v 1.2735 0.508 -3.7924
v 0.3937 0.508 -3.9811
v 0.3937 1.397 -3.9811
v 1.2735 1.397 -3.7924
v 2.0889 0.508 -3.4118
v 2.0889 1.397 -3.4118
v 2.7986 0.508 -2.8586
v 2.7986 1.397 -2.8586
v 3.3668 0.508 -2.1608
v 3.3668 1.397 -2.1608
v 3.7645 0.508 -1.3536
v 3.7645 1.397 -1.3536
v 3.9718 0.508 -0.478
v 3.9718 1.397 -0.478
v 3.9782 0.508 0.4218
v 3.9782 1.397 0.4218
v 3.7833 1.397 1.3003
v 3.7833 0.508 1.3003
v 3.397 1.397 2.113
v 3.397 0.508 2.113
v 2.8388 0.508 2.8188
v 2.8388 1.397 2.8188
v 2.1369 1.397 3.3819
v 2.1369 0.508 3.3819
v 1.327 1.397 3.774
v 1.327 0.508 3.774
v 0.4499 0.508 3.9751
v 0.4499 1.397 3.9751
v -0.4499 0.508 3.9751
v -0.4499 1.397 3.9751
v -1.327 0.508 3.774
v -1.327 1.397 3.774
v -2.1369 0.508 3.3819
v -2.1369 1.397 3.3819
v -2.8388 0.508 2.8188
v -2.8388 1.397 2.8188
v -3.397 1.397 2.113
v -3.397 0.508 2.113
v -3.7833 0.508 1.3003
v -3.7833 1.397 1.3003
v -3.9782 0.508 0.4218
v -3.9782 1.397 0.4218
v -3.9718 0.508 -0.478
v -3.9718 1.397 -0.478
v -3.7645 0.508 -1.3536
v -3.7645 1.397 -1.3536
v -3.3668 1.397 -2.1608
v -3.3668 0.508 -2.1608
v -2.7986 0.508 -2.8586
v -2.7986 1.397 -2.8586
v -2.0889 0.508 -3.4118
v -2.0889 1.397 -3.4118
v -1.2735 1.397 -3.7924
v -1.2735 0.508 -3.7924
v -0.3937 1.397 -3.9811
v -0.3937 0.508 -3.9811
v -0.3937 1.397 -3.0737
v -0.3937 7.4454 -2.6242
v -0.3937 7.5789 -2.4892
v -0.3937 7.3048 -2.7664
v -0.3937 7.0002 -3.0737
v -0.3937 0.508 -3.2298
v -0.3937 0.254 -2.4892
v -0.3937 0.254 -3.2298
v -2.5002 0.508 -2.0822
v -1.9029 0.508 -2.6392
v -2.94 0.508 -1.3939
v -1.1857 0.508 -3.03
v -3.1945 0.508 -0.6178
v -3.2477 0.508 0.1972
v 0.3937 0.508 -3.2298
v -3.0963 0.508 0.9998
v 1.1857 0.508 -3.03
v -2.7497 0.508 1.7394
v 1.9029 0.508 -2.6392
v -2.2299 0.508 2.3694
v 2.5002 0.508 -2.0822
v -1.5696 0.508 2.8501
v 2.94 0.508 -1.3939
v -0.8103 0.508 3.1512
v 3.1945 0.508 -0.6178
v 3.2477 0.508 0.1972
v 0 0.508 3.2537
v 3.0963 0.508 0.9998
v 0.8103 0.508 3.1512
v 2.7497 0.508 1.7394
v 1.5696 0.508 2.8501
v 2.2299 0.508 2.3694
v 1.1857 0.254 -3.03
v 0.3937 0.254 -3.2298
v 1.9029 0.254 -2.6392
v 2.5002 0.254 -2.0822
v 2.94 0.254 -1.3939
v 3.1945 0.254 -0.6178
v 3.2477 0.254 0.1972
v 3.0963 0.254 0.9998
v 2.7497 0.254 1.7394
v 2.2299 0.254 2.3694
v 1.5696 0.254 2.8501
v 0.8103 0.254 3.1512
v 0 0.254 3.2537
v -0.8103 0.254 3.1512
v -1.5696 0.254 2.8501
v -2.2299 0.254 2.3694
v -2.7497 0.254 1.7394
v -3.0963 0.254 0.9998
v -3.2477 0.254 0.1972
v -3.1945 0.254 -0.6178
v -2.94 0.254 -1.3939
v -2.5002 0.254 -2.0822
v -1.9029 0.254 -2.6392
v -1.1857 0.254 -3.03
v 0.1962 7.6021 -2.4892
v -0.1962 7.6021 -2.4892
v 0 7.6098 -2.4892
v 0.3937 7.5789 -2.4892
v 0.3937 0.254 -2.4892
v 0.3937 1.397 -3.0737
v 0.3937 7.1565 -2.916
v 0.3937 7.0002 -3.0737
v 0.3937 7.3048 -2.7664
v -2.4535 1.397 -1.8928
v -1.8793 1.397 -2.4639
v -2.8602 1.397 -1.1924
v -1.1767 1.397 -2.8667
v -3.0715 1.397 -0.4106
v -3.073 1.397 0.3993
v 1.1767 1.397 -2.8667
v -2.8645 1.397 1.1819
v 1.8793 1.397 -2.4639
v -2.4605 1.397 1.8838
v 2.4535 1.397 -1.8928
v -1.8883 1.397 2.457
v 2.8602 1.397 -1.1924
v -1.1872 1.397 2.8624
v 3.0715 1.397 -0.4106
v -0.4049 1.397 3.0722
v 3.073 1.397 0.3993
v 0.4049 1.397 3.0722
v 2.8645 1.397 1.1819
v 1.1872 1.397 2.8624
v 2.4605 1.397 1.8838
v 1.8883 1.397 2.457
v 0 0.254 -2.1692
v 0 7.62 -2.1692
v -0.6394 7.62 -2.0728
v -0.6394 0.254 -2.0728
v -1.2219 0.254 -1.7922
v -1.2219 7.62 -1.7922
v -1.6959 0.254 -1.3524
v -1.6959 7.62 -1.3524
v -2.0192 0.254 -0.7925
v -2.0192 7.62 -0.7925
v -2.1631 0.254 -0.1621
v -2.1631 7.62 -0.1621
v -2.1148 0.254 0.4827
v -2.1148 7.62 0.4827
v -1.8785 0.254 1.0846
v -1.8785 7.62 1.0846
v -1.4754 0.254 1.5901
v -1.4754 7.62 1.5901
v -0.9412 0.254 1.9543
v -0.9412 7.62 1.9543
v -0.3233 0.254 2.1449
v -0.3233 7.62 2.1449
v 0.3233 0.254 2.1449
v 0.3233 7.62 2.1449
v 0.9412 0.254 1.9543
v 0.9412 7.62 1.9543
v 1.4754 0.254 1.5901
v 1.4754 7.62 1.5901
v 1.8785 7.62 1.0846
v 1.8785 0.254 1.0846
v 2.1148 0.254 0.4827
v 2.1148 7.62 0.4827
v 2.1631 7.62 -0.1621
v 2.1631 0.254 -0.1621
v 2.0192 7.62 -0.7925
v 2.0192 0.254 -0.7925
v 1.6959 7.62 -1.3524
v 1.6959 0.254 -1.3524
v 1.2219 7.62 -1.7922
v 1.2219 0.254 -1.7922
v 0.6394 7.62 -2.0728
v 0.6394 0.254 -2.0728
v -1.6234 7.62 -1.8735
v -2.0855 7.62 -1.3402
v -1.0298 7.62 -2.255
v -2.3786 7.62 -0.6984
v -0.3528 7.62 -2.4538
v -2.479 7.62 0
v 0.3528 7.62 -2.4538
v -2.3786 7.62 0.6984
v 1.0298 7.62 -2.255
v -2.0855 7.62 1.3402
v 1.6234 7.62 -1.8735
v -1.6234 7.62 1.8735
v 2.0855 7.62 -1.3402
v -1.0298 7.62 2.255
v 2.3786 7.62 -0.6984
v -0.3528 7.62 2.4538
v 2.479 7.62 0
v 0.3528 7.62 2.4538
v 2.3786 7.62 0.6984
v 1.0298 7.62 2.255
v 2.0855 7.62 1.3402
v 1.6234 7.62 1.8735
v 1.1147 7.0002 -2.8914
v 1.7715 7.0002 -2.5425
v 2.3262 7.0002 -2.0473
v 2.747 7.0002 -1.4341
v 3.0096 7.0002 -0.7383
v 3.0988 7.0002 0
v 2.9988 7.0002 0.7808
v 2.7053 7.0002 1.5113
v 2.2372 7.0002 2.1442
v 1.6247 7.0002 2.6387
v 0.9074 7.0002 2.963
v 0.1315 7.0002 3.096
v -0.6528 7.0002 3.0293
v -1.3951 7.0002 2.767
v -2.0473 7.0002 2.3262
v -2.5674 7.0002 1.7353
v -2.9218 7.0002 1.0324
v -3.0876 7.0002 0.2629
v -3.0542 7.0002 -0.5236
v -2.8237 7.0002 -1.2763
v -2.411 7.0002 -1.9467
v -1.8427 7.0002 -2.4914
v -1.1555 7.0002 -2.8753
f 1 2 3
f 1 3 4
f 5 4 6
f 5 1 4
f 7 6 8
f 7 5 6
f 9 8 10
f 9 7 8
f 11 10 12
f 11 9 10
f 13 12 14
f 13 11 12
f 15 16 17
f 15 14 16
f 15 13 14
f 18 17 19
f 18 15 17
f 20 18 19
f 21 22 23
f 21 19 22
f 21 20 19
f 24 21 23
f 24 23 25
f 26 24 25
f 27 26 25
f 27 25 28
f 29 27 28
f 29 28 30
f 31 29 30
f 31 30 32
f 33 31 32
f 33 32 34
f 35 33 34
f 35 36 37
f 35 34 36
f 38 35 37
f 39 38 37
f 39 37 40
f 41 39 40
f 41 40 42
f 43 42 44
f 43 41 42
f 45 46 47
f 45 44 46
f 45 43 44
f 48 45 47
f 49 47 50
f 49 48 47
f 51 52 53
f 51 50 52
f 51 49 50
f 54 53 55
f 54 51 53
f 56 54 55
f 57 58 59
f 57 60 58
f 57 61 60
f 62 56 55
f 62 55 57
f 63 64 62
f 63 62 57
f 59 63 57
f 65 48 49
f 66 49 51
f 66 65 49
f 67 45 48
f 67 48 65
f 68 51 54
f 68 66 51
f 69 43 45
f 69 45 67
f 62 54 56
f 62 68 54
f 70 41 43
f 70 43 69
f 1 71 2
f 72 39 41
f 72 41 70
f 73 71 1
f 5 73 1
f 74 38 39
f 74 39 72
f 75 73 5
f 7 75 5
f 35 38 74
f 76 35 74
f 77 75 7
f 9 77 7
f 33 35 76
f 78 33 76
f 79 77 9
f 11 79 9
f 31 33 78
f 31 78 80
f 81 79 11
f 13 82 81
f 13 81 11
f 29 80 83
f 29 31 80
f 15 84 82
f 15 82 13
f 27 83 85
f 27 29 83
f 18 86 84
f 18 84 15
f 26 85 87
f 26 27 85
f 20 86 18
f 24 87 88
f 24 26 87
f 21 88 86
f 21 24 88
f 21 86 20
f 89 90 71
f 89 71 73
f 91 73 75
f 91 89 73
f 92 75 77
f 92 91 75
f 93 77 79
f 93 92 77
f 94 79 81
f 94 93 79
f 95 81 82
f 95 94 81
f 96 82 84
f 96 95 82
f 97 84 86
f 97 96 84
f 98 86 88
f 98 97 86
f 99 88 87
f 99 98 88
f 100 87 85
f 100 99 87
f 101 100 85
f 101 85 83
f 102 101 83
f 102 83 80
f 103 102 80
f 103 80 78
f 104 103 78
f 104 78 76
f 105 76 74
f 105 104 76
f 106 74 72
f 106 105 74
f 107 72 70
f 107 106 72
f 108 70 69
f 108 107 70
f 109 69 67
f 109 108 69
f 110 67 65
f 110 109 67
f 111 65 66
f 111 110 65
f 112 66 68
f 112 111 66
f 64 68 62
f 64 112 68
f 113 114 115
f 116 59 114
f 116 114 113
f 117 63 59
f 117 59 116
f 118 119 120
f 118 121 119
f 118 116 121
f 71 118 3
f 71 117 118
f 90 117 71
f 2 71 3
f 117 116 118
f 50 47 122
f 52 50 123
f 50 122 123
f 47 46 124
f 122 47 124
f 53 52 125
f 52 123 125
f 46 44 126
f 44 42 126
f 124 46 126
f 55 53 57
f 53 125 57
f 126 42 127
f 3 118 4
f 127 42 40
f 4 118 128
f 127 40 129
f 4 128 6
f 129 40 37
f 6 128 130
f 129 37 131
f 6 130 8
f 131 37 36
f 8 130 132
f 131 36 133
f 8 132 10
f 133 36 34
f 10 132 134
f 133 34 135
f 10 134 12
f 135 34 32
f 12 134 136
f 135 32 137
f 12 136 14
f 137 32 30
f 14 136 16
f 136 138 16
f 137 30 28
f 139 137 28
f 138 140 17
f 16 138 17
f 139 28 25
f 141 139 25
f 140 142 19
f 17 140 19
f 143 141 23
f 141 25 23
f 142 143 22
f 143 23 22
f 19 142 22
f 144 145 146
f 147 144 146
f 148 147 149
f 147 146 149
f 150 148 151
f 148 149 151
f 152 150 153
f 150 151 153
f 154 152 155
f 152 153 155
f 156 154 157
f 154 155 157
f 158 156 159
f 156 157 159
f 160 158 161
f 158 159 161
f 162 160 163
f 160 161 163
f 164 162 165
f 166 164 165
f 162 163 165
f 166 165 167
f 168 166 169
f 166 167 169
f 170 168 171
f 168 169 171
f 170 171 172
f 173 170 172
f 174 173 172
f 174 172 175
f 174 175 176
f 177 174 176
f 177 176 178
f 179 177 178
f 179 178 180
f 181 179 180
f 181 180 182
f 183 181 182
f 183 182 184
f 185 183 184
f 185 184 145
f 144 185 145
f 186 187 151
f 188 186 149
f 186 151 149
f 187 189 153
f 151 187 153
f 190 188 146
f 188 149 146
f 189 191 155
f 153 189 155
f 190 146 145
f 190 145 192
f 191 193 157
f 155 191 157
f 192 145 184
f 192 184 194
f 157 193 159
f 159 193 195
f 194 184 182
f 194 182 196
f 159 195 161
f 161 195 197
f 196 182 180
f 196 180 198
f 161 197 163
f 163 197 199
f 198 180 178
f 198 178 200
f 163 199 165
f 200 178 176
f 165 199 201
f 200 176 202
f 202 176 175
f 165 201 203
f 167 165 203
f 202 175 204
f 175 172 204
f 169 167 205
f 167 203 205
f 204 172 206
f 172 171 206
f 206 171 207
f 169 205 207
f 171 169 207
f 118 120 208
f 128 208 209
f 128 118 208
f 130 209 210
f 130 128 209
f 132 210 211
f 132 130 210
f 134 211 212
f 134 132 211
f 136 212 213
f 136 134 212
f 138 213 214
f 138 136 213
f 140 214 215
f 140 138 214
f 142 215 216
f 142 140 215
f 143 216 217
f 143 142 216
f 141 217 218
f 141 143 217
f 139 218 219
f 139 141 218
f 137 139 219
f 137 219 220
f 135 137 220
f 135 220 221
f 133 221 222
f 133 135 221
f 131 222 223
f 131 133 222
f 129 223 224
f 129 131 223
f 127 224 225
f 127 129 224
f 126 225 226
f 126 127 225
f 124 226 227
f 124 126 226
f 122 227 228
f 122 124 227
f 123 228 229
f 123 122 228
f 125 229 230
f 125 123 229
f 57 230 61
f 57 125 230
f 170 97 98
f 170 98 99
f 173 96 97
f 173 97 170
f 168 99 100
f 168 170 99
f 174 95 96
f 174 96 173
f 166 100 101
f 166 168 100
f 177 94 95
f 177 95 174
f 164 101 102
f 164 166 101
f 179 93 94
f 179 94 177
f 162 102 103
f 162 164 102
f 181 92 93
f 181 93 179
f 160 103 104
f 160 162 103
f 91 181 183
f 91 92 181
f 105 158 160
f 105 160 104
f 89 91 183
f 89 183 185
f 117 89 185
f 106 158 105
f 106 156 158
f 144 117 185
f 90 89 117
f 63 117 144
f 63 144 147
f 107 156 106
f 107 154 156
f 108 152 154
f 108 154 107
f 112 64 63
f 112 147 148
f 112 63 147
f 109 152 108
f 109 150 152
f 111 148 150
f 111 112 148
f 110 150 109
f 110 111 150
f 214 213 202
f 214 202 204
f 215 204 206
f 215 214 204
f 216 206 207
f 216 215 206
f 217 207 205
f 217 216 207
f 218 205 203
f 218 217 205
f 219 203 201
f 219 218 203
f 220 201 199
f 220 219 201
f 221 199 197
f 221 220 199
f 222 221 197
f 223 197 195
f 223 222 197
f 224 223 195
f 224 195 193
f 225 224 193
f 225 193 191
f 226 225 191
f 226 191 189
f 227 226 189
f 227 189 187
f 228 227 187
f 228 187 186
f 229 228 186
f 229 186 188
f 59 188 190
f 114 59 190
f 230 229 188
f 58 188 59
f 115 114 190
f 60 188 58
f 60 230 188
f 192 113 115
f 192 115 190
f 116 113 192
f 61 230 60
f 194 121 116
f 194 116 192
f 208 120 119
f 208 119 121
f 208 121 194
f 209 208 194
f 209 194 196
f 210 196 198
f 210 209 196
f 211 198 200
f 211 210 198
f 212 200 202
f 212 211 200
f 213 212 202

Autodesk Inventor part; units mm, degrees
sketch "Sketch_1" plane through (0, 0, 0) normal (0, 0, 1) x (1, 0, 0)
  line L0 (-3.9497, 0) -> (3.9497, 0)
  arc A0 (3.9497, 0) -> (3.6957, 0.254) centre (3.6957, 0) ccw
  line L1 (3.6957, 0.254) -> (-3.6957, 0.254)
  arc A1 (-3.6957, 0.254) -> (-3.9497, 0) centre (-3.6957, 0) ccw
extrude "Extrusion1" add sketch "Sketch_1" along normal mid plane 13.0048
sketch "Sketch_7" plane through (0, 0, 0) normal (0, 0, 1) x (1, 0, 0)
  line L0 (0, 0.127) -> (0, 7.62)
  line L1 (0, 7.62) -> (2.479, 7.62)
  line L2 (2.479, 7.62) -> (3.0988, 7.0002)
  line L3 (3.0988, 7.0002) -> (3.0988, 1.397)
  line L4 (3.0988, 1.397) -> (4.0005, 1.397)
  line L5 (4.0005, 1.397) -> (4.0005, 0.508)
  line L6 (4.0005, 0.508) -> (3.2537, 0.508)
  line L7 (3.2537, 0.508) -> (3.2537, 0.127)
  line L8 (3.2537, 0.127) -> (0, 0.127)
  line L9 (0, 0.127) -> (0, 7.62)
revolve "Revolution1" add sketch "Sketch_7" angle 360 about axis through (0, 0.127, 0) along (0, -1, 0)
sketch "Sketch_8" plane through (0, 0.254, 0) normal (0, 1, 0) x (1, 0, 0)
  line L0 (-0.3937, 2.4892) -> (0.3937, 2.4892)
  line L1 (0.3937, 2.4892) -> (0.3937, 10.4902)
  line L2 (0.3937, 10.4902) -> (-0.3937, 10.4902)
  line L3 (-0.3937, 10.4902) -> (-0.3937, 2.4892)
extrude "Extrusion2" cut sketch "Sketch_8" along normal blind 7.9629
sketch "Sketch4" plane through (-3.9497, 0, 6.5024) normal (0, -1, 0) x (1, 0, 0)
  point P0 (3.9497, -6.5024)
hole "Drilling 1" at (0, 0, 0) direction (0, 1, 0) diameter 4.3383 depth 7.874
sketch "Sketch_2" plane through (0, 0, 0) normal (0, 0, 1) x (1, 0, 0)
  line L0 (-3.9497, 0.254) -> (-3.9497, 0)
  line L1 (-3.9497, 0) -> (3.9497, 0)
  line L2 (3.9497, 0) -> (3.9497, 0.254)
  line L3 (3.9497, 0.254) -> (-3.9497, 0.254)
extrude "Extrusion3" cut sketch "Sketch_2" along normal mid plane 13.0048
ref_plane "1_XY" through (0, 5.7912, 0) normal (0, 1, 0) x (1, 0, 0)
ref_plane "1_YZ" through (0, 5.7912, 0) normal (1, 0, 0) x (0, 0, -1)
ref_plane "1_ZX" through (0, 5.7912, 0) normal (0, 0, -1) x (0, 1, 0)
ref_plane "2_XY" through (0, 4.3434, 0) normal (0, 1, 0) x (1, 0, 0)
ref_plane "2_YZ" through (0, 4.3434, 0) normal (1, 0, 0) x (0, 0, -1)
ref_plane "2_ZX" through (0, 4.3434, 0) normal (0, 0, -1) x (0, 1, 0)
ref_plane "3_XY" through (0, 2.8956, 0) normal (0, 1, 0) x (1, 0, 0)
ref_plane "3_YZ" through (0, 2.8956, 0) normal (1, 0, 0) x (0, 0, -1)
ref_plane "3_ZX" through (0, 2.8956, 0) normal (0, 0, -1) x (0, 1, 0)
ref_plane "4_XY" through (0, 1.8097, 0) normal (0, 1, 0) x (1, 0, 0)
ref_plane "4_YZ" through (0, 1.8097, 0) normal (1, 0, 0) x (0, 0, -1)
ref_plane "4_ZX" through (0, 1.8097, 0) normal (0, 0, -1) x (0, 1, 0)
ref_plane "to_base_XY" through (0, 0, 0) normal (0, 1, 0) x (1, 0, 0)
ref_plane "to_base_YZ" through (0, 0, 0) normal (1, 0, 0) x (0, 0, -1)
ref_plane "to_base_ZX" through (0, 0, 0) normal (0, 0, -1) x (0, 1, 0)
properties part number "M20ANG1A2M201BR-bushing"
